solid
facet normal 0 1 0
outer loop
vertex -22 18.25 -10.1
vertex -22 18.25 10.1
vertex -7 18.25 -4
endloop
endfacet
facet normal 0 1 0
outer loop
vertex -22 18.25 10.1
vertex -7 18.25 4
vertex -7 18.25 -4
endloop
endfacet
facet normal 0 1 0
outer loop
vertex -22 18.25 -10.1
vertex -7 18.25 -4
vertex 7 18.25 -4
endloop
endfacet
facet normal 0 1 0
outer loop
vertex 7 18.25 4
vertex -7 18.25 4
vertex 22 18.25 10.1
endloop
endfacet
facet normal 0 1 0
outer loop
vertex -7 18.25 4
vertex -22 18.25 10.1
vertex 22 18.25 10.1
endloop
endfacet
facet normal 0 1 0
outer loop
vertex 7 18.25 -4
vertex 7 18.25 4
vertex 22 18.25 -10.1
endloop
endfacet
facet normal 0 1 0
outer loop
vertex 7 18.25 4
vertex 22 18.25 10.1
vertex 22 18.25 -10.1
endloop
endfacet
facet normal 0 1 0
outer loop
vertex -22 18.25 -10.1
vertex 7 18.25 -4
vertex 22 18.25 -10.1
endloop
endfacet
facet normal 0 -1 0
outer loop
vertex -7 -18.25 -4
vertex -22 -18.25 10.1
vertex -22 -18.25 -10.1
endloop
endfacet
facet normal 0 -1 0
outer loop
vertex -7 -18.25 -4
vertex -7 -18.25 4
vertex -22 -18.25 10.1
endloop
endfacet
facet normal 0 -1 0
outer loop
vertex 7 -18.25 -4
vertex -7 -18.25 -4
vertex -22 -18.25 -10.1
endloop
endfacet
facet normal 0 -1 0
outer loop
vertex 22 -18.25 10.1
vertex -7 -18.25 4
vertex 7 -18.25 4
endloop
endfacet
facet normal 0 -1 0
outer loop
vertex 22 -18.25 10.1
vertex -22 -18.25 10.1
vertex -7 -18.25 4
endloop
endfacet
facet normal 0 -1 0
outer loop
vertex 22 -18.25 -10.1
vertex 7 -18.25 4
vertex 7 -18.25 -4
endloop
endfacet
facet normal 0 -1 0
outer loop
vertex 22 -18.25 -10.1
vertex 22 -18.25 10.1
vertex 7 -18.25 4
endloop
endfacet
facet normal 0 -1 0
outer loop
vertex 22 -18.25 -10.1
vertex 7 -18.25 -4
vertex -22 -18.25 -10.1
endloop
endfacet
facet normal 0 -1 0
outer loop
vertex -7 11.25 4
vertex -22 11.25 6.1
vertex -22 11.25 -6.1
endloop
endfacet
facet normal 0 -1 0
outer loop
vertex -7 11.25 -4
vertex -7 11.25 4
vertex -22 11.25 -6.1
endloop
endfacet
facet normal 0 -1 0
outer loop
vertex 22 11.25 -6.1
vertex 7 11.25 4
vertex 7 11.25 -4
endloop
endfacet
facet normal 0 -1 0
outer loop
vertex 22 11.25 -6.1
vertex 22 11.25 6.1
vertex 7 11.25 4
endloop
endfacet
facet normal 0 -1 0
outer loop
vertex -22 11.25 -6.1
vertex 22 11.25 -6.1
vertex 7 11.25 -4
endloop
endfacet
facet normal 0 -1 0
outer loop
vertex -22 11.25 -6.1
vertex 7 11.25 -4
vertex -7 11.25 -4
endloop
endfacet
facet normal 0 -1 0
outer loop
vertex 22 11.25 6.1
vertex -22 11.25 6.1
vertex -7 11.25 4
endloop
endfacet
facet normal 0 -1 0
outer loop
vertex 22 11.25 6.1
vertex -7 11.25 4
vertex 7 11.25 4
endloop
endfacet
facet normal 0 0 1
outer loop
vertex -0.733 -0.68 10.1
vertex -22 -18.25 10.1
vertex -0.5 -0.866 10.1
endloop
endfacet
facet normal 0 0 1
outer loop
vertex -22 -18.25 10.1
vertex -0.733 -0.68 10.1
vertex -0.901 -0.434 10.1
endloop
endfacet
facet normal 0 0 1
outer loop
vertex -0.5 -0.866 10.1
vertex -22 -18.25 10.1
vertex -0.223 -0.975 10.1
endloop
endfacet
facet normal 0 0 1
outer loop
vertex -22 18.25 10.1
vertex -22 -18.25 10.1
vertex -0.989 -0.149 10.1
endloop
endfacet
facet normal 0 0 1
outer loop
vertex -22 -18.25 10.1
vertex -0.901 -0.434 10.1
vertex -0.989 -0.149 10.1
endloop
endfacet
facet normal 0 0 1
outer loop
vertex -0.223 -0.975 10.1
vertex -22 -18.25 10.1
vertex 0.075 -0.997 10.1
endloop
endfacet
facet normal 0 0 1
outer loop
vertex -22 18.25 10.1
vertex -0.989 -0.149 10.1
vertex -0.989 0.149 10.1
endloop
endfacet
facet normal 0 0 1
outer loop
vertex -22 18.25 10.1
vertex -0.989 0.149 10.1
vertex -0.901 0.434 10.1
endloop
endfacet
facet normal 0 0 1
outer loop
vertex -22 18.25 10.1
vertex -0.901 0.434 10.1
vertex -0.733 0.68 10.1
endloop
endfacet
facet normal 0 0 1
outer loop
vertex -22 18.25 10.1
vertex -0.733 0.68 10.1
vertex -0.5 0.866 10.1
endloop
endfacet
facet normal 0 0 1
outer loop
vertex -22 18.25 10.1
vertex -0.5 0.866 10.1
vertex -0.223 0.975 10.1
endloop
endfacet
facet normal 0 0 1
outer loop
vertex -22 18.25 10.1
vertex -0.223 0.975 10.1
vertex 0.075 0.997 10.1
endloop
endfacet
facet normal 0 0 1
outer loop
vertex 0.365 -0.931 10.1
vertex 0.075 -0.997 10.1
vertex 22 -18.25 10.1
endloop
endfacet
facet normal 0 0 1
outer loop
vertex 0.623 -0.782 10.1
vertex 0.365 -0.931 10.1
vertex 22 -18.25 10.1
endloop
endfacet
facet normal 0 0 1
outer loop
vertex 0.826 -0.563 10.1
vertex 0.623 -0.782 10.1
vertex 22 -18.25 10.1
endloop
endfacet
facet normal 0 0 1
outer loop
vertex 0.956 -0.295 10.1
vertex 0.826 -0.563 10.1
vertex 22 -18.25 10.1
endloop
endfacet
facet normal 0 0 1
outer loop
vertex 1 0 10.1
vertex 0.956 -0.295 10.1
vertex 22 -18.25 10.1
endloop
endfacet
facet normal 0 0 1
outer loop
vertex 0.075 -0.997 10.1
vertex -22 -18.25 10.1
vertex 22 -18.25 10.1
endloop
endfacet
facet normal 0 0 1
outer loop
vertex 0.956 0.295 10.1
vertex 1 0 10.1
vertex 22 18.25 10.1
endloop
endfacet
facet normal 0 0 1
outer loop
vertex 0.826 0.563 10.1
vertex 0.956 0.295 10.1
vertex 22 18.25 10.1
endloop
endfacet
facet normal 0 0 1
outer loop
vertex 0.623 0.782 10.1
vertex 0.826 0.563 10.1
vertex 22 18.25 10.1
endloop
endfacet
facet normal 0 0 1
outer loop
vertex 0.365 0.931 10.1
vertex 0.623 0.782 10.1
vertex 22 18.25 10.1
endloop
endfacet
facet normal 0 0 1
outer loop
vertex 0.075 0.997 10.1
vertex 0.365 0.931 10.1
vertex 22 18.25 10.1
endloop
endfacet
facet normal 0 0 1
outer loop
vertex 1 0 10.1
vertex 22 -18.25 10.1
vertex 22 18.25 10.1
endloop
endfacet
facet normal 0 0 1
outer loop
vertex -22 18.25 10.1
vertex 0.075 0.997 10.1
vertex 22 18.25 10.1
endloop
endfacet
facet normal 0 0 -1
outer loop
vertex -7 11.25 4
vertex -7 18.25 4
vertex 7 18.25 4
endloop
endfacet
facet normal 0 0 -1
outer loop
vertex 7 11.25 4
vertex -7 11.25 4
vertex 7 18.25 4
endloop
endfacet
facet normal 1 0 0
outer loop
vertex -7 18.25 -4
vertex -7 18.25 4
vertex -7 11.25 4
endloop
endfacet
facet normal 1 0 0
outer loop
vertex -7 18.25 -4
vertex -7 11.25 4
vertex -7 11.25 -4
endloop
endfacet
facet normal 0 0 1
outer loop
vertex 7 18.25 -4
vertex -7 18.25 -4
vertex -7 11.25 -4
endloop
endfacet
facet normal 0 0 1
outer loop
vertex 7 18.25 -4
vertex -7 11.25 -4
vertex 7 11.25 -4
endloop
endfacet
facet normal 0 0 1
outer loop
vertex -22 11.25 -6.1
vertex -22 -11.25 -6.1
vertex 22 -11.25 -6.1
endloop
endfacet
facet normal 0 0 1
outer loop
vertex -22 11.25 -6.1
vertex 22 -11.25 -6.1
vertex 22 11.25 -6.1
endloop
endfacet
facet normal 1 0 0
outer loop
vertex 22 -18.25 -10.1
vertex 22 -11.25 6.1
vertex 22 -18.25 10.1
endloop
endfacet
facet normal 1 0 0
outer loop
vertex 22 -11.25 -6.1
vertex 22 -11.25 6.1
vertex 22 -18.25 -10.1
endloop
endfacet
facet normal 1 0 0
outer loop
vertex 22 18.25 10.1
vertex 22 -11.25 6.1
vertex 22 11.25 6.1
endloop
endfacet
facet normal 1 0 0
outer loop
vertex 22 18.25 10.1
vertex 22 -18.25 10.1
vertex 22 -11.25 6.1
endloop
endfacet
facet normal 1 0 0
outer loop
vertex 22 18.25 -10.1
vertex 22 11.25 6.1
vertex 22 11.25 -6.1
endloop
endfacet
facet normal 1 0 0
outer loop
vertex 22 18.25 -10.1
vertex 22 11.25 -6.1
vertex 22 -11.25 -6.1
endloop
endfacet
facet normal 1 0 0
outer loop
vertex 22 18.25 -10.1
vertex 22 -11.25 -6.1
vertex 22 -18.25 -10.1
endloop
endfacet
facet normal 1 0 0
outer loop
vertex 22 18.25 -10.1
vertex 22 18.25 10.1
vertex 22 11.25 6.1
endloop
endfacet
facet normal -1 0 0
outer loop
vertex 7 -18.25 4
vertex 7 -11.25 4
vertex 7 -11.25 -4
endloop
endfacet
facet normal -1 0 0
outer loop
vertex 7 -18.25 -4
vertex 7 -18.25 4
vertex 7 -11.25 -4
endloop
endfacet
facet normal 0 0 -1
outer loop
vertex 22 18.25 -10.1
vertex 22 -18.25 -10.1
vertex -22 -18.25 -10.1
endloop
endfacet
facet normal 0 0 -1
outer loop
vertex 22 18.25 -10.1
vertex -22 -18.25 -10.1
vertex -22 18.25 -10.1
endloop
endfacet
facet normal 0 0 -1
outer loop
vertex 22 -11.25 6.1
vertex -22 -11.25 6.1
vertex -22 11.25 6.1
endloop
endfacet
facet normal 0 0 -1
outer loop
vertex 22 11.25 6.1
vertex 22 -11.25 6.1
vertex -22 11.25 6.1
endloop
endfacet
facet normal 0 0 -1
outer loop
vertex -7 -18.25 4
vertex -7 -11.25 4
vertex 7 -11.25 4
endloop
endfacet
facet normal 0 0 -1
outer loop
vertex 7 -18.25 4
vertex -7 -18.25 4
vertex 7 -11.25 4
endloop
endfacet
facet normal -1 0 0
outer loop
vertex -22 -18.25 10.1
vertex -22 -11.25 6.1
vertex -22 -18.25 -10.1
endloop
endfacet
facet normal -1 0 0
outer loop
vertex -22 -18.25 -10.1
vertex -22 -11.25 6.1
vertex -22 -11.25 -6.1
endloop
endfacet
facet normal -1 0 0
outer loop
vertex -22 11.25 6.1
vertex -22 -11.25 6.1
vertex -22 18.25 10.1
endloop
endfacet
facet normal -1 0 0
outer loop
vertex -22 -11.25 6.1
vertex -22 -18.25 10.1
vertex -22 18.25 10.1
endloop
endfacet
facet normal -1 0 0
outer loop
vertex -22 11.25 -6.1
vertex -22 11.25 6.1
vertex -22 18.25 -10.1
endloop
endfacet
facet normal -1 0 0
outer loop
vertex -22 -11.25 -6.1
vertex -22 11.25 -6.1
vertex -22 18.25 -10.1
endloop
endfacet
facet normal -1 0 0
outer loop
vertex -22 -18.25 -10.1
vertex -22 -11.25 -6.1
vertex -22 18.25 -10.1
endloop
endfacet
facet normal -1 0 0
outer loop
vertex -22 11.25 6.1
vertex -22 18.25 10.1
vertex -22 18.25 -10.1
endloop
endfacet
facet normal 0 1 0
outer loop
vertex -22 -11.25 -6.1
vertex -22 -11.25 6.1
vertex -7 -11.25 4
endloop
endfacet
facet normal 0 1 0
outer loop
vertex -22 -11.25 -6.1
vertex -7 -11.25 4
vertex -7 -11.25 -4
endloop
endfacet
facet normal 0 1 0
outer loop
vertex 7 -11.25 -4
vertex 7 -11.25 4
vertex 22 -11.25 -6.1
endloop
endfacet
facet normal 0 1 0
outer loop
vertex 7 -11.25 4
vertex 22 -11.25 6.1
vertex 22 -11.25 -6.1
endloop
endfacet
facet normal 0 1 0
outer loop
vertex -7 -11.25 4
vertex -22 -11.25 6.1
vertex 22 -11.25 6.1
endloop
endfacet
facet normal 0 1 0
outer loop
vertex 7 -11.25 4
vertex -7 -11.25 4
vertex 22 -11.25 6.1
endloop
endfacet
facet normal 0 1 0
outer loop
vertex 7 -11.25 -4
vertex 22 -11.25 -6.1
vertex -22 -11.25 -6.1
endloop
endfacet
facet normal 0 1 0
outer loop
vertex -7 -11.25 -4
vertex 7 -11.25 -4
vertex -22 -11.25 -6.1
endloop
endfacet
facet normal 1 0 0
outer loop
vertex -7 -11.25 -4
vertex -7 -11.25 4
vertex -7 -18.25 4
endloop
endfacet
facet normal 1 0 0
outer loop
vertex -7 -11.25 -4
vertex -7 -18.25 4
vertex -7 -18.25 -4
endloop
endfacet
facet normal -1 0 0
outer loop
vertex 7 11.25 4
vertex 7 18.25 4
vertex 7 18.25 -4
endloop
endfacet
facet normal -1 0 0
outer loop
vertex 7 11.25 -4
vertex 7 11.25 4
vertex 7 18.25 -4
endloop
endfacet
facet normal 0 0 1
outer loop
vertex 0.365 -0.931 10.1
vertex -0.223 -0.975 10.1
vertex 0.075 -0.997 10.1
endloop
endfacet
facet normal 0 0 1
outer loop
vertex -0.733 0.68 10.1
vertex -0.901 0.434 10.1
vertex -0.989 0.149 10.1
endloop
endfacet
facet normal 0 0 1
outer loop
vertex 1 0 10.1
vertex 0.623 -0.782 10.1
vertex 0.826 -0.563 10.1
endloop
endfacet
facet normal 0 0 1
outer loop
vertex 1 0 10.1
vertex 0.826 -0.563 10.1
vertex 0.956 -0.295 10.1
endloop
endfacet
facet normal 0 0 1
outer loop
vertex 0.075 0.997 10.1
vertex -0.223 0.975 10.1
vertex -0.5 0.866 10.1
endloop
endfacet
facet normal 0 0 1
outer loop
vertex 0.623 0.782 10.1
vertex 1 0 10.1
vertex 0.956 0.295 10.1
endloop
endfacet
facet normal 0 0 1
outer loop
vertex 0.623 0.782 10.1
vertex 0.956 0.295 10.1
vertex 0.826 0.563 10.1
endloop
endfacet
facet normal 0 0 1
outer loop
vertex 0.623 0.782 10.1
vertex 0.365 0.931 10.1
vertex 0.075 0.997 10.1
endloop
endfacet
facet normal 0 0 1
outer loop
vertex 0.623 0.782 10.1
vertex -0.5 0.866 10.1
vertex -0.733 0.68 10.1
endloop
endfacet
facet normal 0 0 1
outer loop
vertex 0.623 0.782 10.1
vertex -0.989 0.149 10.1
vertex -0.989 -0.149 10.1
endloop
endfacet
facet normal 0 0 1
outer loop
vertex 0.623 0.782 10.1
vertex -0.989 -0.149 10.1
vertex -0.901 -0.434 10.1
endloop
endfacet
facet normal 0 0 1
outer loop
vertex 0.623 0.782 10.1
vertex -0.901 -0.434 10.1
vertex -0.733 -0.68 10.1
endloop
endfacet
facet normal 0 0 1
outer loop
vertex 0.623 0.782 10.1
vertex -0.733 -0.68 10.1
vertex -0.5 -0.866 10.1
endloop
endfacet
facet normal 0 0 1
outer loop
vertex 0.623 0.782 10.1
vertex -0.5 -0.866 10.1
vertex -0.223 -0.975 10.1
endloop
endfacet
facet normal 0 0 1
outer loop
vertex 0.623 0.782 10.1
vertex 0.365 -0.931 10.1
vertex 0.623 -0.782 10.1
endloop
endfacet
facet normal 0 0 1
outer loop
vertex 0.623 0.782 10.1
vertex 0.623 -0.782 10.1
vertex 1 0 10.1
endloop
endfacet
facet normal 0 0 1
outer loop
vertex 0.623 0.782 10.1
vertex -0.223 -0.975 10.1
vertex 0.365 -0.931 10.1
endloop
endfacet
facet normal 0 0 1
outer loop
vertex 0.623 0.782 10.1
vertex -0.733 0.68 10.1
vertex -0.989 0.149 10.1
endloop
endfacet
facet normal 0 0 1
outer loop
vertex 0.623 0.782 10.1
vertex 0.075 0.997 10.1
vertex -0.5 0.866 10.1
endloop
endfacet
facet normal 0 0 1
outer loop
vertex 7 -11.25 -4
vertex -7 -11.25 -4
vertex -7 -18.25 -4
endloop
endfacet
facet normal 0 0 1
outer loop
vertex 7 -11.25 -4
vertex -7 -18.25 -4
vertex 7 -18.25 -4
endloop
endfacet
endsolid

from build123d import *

# Parameters (mm, degrees)
SKETCH1_W           = 20.2
SKETCH1_H           = 36.5
SKETCH1_W_2         = 12.2
SKETCH1_H_2         = 22.5
BOSS_EXTRUDE1_DEPTH = 22
SKETCH3_R           = 1
CUT_EXTRUDE2_DEPTH  = 0.0001
SKETCH6_W           = 14
SKETCH6_H           = 8
CUT_EXTRUDE3_DEPTH  = 25


with BuildPart() as part:
    # Sketch1 → Boss-Extrude1 (new body, symmetric)
    with BuildSketch(Plane(origin=(0, 0, 0), x_dir=(0, 0, -1), z_dir=(1, 0, 0))):
        Rectangle(SKETCH1_W, SKETCH1_H)
        Rectangle(SKETCH1_W_2, SKETCH1_H_2, mode=Mode.SUBTRACT)
    extrude(amount=BOSS_EXTRUDE1_DEPTH, both=True)

    # Sketch3 → Cut-Extrude2 (cut)
    with BuildSketch(Plane.XY.offset(10.1)):
        Circle(SKETCH3_R)
    extrude(amount=-CUT_EXTRUDE2_DEPTH, mode=Mode.SUBTRACT)

    # Sketch6 → Cut-Extrude3 (cut, symmetric)
    with BuildSketch(Plane(origin=(0, 0, 0), x_dir=(1, 0, 0), z_dir=(0, 1, 0))):
        Rectangle(SKETCH6_W, SKETCH6_H)
    extrude(amount=CUT_EXTRUDE3_DEPTH, both=True, mode=Mode.SUBTRACT)


solid = part.part
